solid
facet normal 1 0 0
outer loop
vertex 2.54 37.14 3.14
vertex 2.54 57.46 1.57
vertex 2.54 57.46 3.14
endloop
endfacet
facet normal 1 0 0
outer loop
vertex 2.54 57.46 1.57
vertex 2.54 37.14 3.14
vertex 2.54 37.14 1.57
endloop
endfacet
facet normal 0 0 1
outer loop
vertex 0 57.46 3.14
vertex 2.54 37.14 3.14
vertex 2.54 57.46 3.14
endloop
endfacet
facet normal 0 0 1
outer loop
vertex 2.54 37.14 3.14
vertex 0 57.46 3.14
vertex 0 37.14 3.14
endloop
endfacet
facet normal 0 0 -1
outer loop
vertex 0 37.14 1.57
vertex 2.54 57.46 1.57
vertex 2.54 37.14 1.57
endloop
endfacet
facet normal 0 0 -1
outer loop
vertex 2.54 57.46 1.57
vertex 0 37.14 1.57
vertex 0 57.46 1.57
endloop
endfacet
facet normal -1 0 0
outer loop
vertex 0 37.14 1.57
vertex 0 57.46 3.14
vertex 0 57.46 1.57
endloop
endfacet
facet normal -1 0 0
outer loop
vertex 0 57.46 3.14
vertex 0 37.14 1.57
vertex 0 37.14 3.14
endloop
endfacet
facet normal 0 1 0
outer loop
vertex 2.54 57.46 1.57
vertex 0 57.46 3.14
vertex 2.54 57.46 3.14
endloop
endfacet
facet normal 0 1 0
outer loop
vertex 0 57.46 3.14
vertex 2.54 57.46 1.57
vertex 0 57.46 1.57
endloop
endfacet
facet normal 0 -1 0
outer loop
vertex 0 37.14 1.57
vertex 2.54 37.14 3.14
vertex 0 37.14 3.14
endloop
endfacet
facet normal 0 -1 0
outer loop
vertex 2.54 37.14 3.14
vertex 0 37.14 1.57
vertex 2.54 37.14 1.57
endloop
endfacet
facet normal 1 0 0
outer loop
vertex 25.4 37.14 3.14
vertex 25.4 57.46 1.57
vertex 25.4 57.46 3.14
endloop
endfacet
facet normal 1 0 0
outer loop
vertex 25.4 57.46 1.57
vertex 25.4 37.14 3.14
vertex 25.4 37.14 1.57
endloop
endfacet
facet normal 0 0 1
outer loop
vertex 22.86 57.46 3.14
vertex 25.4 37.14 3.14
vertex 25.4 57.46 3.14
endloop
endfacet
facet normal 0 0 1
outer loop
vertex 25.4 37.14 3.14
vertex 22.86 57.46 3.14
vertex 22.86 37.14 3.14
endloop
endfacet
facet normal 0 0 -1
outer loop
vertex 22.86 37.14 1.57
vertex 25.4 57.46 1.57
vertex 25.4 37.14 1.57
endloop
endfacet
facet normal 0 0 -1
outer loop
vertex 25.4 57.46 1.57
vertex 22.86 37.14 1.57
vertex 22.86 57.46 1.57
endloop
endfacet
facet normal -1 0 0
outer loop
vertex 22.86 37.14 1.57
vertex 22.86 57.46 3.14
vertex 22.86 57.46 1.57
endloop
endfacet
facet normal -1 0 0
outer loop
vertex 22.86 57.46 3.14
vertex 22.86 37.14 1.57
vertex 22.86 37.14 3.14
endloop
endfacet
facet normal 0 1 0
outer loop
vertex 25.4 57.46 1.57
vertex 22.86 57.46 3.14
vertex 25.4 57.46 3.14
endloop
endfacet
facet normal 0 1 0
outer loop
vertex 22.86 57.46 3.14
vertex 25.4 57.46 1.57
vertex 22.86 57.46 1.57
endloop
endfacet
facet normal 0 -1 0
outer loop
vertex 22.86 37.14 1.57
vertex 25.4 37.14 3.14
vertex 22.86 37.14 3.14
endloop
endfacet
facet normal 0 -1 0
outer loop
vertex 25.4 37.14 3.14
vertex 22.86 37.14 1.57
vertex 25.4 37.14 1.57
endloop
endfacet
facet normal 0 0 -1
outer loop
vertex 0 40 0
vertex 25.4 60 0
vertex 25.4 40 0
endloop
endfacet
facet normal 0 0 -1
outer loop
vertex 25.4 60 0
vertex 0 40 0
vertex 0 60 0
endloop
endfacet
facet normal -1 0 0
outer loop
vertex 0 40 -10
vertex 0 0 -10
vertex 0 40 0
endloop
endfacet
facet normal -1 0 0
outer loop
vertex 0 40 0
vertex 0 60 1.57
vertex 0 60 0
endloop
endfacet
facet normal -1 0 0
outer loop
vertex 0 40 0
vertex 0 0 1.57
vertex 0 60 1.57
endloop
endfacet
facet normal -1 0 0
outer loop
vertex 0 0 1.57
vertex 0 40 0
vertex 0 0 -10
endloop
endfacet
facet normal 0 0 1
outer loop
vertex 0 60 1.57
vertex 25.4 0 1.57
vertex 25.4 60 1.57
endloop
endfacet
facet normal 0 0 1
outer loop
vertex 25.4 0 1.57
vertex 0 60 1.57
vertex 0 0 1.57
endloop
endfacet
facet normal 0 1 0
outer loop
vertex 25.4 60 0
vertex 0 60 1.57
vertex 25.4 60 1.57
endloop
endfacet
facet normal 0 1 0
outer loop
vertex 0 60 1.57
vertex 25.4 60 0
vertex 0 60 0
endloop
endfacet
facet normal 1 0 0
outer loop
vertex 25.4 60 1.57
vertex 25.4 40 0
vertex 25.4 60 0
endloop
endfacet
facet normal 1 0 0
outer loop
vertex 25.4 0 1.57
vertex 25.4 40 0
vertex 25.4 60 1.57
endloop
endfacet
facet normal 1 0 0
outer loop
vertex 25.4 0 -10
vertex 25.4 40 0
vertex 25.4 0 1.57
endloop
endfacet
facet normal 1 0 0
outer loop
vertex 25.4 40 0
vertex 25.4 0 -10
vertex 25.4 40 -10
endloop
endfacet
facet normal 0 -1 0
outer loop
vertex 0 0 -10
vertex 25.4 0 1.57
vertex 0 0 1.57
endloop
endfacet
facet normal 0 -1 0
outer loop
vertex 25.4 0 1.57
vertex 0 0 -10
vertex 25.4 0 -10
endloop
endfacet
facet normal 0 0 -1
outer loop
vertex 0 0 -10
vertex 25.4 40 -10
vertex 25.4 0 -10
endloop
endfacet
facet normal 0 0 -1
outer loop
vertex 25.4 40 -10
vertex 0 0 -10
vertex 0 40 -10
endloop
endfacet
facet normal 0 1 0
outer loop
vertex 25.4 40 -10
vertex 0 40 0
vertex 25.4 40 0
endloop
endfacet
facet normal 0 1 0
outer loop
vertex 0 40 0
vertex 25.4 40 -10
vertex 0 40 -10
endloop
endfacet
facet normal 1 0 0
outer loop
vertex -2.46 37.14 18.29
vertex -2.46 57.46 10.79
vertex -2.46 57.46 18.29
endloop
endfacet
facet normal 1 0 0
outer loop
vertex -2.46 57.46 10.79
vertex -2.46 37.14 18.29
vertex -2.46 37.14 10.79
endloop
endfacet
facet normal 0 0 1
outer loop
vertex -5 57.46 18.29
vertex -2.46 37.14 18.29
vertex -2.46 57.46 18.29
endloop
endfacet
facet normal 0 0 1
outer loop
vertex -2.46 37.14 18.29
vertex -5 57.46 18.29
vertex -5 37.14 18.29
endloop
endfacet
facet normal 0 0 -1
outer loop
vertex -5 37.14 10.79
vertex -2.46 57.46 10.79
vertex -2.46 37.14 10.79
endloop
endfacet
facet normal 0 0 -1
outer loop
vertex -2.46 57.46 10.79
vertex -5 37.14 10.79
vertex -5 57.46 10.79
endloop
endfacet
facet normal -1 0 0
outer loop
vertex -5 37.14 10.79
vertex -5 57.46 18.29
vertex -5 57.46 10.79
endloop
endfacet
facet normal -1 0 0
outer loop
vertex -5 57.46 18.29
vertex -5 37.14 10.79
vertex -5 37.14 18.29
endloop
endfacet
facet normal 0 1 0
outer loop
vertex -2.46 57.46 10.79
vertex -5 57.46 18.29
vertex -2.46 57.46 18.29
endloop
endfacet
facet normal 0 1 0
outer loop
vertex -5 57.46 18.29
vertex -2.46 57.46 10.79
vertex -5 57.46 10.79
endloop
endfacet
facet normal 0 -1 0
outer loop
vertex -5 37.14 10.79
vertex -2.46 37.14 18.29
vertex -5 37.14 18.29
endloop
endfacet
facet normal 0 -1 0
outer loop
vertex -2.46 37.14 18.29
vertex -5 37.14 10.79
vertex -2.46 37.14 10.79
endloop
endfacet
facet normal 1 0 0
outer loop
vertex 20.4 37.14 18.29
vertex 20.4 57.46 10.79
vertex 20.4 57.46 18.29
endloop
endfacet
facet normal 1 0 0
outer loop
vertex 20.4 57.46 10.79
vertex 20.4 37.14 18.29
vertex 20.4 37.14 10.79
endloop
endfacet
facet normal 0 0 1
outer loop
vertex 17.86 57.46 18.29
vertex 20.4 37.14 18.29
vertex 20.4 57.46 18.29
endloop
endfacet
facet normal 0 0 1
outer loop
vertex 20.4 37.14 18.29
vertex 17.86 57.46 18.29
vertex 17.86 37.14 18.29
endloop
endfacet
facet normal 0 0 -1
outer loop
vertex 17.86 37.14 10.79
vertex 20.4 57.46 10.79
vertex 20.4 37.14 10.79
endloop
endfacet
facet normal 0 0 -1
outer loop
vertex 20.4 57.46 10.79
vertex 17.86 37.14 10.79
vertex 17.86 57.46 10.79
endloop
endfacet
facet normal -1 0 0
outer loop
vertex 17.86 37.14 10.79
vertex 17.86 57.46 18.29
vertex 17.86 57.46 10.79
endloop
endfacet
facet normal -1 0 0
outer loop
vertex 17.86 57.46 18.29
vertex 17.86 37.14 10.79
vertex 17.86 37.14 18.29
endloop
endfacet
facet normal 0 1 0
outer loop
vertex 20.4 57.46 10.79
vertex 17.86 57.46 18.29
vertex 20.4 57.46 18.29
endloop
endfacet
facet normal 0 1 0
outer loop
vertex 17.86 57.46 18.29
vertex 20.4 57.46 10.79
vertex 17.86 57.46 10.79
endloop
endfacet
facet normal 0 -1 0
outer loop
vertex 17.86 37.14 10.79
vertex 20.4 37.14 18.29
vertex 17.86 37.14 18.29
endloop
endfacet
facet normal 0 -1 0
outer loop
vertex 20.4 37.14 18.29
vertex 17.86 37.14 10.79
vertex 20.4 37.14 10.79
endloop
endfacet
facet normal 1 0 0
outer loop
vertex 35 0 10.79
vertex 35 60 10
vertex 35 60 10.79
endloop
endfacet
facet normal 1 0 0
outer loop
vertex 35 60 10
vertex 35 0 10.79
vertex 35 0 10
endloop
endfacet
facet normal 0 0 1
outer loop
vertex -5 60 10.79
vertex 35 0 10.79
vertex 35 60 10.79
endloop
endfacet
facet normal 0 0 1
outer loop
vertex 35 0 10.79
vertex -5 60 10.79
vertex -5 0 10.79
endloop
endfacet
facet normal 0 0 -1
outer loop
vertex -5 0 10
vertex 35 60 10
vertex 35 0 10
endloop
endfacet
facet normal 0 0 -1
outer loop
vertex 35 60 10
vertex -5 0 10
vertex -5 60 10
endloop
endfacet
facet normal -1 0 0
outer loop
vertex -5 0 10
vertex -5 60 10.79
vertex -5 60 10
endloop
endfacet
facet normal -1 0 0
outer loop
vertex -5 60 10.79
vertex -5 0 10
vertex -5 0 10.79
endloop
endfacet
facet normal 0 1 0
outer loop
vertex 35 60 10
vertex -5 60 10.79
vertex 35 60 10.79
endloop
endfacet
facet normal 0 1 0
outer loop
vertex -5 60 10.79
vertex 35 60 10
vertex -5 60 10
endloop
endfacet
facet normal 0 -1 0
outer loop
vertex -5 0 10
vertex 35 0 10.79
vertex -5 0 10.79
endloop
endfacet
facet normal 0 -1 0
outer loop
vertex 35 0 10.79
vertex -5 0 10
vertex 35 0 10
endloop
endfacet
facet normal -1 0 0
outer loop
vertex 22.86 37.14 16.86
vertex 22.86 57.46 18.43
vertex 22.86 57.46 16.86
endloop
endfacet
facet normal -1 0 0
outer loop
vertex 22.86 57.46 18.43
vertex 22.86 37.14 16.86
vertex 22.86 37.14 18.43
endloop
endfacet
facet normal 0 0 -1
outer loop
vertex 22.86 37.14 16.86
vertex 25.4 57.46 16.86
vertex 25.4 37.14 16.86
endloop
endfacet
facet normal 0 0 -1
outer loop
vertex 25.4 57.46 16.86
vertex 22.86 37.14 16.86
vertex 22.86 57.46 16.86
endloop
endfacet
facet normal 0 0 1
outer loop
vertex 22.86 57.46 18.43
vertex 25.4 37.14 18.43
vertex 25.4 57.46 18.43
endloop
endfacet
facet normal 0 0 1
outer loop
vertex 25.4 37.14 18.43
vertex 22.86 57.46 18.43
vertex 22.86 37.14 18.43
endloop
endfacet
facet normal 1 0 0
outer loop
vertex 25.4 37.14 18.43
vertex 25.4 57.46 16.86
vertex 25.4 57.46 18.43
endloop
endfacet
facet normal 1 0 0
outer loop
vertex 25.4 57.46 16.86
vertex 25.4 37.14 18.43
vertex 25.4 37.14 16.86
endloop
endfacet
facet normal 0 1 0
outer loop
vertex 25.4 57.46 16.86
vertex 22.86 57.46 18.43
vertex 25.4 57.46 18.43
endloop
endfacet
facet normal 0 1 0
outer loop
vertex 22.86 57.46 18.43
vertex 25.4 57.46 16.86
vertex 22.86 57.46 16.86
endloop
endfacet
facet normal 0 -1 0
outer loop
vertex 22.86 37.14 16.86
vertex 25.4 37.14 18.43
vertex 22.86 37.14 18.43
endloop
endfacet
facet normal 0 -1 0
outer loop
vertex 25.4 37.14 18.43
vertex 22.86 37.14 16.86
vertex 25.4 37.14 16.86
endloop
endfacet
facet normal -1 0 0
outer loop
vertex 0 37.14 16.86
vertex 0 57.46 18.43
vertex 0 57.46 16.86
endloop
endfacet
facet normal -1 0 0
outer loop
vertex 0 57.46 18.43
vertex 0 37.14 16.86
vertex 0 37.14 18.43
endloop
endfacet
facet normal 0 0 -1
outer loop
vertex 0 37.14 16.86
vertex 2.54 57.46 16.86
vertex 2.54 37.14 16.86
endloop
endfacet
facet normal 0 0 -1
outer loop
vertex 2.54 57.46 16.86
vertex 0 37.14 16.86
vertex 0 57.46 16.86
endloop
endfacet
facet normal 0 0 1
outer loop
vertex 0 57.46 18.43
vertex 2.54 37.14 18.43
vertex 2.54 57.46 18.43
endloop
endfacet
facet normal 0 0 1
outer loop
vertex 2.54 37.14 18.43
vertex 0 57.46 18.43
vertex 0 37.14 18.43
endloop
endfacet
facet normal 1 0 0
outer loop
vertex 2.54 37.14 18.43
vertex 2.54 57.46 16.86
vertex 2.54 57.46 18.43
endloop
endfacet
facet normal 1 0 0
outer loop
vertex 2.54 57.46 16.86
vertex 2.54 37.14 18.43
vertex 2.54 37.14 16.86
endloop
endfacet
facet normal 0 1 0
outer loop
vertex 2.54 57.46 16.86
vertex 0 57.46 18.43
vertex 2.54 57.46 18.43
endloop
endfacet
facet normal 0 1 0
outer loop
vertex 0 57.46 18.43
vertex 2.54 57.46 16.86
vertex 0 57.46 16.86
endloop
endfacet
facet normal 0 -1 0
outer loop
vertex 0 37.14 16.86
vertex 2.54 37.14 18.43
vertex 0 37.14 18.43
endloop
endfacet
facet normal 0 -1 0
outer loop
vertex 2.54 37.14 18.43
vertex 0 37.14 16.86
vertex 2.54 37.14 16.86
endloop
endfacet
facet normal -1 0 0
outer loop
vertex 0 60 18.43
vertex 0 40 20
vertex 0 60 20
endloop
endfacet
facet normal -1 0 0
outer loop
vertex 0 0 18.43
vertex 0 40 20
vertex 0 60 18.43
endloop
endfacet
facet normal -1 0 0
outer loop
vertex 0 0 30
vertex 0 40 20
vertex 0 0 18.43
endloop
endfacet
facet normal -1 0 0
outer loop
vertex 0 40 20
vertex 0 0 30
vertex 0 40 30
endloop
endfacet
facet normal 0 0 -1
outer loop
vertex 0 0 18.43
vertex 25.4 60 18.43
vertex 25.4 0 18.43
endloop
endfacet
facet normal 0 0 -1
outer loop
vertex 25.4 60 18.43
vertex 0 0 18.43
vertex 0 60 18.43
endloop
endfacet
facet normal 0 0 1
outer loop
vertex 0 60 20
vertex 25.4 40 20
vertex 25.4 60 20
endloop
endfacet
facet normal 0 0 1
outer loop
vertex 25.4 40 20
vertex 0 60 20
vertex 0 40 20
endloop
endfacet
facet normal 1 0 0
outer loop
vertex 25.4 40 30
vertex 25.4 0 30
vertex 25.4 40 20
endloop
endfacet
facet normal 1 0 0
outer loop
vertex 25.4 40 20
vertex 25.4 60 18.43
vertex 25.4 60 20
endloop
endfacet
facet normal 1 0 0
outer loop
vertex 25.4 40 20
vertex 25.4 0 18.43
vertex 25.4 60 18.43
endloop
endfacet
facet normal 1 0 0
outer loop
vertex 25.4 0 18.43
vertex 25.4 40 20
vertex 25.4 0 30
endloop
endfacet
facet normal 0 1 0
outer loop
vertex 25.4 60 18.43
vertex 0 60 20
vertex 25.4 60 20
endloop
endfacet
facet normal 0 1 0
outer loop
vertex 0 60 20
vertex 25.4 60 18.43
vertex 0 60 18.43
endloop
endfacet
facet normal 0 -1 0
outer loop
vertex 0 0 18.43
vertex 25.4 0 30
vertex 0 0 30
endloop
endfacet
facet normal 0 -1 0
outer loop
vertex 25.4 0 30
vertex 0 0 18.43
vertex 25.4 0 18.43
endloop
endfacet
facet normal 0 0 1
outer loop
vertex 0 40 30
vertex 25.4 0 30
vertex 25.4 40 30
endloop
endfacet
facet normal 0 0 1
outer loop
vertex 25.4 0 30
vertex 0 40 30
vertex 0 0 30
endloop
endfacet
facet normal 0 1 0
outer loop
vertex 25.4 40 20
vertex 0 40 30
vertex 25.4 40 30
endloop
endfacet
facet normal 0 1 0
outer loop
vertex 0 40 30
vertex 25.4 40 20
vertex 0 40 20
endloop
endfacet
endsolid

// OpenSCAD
union() {
color("black")
translate([0,60-9*2.54,1.57])
union() {
cube([2.54,8*2.54,1.57]);
translate([9*2.54,0,0])
cube([2.54,8*2.54,1.57]);
}
color("green")
linear_extrude(1.57)
square([25.4,60]);
color("yellow")
translate([0,0,-10])
cube([25.4,40,10]);
}

translate([-5,0,10])
union() {
color("black")
translate([0,60-9*2.54,0.79])
union() {
cube([2.54,8*2.54,7.5]);
translate([9*2.54,0,0])
cube([2.54,8*2.54,7.5]);
}
color("green")
cube([40,60,0.79]);
}

translate([25.4,0,20])
rotate([0,180,0])
union() {
color("black")
translate([0,60-9*2.54,1.57])
union() {
cube([2.54,8*2.54,1.57]);
translate([9*2.54,0,0])
cube([2.54,8*2.54,1.57]);
}
color("green")
cube([25.4,60,1.57]);
color("yellow")
translate([0,0,-10])
cube([25.4,40,10]);
}
